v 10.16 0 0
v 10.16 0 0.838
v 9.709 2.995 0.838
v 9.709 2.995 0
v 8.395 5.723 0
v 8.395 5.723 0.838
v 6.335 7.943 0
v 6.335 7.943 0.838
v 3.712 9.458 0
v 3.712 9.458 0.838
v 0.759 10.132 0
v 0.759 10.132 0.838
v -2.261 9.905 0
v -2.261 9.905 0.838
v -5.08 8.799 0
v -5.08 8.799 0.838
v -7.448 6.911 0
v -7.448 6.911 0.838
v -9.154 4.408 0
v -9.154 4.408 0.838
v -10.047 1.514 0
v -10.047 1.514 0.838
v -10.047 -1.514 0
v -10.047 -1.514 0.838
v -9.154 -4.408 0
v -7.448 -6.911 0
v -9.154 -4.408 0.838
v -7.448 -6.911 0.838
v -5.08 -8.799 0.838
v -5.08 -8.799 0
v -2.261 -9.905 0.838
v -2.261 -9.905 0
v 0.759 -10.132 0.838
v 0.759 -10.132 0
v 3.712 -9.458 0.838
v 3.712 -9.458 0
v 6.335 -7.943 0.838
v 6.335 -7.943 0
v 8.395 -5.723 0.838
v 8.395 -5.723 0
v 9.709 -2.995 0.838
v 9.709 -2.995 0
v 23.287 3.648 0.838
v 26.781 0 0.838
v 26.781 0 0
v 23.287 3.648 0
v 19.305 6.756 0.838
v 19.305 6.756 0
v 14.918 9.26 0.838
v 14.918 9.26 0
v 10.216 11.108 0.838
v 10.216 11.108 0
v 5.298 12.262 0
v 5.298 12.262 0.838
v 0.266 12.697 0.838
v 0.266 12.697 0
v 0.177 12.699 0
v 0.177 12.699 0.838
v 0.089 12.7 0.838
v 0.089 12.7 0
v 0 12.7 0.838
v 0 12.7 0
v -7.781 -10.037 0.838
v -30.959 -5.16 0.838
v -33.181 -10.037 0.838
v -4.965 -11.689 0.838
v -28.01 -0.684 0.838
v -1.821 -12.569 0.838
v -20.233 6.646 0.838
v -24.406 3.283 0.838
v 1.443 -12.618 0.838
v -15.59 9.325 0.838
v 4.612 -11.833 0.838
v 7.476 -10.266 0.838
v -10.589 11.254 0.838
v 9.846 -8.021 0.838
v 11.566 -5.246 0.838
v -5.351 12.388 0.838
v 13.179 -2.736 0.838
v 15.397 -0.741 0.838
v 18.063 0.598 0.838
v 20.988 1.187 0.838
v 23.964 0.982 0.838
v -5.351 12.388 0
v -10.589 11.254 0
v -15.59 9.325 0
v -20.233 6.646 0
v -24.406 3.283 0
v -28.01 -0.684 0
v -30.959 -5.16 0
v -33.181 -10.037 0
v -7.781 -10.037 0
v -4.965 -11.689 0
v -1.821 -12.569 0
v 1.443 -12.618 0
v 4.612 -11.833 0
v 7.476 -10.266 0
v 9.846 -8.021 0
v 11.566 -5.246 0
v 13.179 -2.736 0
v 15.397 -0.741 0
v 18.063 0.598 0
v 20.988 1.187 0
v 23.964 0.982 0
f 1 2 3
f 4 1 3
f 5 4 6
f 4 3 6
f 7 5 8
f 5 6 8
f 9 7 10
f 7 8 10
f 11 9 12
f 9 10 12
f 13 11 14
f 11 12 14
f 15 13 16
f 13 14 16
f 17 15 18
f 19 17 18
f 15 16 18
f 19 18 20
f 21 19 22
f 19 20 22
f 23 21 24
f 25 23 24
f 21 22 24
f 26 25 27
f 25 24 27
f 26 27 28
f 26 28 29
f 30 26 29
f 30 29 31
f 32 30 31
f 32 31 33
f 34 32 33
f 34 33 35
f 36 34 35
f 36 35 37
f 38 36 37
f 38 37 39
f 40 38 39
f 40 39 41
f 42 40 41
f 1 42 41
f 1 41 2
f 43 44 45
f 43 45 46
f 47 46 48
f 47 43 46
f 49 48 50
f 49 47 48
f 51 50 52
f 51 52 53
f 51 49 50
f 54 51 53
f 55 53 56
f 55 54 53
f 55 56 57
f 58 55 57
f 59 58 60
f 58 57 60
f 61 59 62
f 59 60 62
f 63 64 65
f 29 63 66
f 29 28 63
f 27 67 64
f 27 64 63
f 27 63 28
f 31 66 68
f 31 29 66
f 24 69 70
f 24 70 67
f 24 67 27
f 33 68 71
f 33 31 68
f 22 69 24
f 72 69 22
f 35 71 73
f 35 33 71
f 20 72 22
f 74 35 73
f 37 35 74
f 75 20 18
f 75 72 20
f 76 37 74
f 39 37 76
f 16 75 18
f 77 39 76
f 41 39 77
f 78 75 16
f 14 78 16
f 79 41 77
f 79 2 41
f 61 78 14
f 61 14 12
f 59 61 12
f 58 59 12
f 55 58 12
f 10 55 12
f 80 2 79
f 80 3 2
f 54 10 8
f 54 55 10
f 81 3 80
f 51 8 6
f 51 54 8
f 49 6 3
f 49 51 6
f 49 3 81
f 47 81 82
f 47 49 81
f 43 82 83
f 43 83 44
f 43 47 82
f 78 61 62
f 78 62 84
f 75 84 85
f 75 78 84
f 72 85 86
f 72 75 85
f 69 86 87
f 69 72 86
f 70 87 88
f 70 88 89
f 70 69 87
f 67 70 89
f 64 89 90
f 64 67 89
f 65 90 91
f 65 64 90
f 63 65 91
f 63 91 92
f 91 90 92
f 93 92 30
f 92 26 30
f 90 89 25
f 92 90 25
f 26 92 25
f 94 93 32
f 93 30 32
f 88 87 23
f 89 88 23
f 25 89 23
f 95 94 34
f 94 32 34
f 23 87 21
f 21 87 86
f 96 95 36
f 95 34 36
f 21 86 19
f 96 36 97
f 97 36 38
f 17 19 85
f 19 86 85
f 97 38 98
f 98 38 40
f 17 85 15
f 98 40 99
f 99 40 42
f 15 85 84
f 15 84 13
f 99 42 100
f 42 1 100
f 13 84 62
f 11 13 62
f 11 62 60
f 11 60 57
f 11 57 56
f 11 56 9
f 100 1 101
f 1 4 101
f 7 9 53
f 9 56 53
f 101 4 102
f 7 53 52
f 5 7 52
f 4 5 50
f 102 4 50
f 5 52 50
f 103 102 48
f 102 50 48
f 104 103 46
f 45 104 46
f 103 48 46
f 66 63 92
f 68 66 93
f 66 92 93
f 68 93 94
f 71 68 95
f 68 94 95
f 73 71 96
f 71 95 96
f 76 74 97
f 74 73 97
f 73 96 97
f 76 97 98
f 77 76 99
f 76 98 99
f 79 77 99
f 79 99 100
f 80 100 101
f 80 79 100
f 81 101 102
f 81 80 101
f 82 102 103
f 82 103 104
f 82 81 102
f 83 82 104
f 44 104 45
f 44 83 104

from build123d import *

# Parameters (mm, degrees)
F0_R     = 12.7
F1_DEPTH = 0.8382
F3_R     = 10.1600000635
F4_DEPTH = 18.288
F5_DEPTH = 0.8382
F7_DEPTH = 0.8382


# Not quite as in the source:
# - a feature of the source that left no trace in its solid (it failed there, or was rolled back) is left out


with BuildPart() as f1:
    # F0 (on Top) → F1 (new body)
    with BuildSketch(Plane.XY):
        Circle(F0_R)
    extrude(amount=F1_DEPTH)

    # F3 (on face) → F4 (cut)
    with BuildSketch(Plane.XY.offset(0.8382)):
        Circle(F3_R)
    extrude(amount=-F4_DEPTH, mode=Mode.SUBTRACT)

    # F2 (on face) → F5 (join)
    with BuildSketch(Plane.XY.offset(0.8382)):
        with BuildLine():
            Line((-33.1810780452, -10.0371721343), (-7.7810780452, -10.0371721343))
            ThreePointArc((-7.7810780452, -10.0371721343), (-12.0158663047, 4.1120502121), (0, 12.7))
            ThreePointArc((0, 12.7), (-20.2325604445, 6.6463315632), (-33.1810780452, -10.0371721343))
        make_face()
    extrude(amount=-F5_DEPTH)

    # F6 (on face) → F7 (join)
    with BuildSketch(Plane.XY.offset(0.8382)):
        with BuildLine():
            ThreePointArc((11.5657650484, -5.2462442609), (18.062719128, 0.5983562843), (26.7811901867, 0))
            ThreePointArc((26.7811901867, 0), (14.9176093432, 9.260079703), (0.265657769, 12.6972211901))
            ThreePointArc((0.265657769, 12.6972211901), (10.7465170902, 6.7677448556), (11.5657650484, -5.2462442609))
        make_face()
    extrude(amount=-F7_DEPTH)


solid = f1.part
